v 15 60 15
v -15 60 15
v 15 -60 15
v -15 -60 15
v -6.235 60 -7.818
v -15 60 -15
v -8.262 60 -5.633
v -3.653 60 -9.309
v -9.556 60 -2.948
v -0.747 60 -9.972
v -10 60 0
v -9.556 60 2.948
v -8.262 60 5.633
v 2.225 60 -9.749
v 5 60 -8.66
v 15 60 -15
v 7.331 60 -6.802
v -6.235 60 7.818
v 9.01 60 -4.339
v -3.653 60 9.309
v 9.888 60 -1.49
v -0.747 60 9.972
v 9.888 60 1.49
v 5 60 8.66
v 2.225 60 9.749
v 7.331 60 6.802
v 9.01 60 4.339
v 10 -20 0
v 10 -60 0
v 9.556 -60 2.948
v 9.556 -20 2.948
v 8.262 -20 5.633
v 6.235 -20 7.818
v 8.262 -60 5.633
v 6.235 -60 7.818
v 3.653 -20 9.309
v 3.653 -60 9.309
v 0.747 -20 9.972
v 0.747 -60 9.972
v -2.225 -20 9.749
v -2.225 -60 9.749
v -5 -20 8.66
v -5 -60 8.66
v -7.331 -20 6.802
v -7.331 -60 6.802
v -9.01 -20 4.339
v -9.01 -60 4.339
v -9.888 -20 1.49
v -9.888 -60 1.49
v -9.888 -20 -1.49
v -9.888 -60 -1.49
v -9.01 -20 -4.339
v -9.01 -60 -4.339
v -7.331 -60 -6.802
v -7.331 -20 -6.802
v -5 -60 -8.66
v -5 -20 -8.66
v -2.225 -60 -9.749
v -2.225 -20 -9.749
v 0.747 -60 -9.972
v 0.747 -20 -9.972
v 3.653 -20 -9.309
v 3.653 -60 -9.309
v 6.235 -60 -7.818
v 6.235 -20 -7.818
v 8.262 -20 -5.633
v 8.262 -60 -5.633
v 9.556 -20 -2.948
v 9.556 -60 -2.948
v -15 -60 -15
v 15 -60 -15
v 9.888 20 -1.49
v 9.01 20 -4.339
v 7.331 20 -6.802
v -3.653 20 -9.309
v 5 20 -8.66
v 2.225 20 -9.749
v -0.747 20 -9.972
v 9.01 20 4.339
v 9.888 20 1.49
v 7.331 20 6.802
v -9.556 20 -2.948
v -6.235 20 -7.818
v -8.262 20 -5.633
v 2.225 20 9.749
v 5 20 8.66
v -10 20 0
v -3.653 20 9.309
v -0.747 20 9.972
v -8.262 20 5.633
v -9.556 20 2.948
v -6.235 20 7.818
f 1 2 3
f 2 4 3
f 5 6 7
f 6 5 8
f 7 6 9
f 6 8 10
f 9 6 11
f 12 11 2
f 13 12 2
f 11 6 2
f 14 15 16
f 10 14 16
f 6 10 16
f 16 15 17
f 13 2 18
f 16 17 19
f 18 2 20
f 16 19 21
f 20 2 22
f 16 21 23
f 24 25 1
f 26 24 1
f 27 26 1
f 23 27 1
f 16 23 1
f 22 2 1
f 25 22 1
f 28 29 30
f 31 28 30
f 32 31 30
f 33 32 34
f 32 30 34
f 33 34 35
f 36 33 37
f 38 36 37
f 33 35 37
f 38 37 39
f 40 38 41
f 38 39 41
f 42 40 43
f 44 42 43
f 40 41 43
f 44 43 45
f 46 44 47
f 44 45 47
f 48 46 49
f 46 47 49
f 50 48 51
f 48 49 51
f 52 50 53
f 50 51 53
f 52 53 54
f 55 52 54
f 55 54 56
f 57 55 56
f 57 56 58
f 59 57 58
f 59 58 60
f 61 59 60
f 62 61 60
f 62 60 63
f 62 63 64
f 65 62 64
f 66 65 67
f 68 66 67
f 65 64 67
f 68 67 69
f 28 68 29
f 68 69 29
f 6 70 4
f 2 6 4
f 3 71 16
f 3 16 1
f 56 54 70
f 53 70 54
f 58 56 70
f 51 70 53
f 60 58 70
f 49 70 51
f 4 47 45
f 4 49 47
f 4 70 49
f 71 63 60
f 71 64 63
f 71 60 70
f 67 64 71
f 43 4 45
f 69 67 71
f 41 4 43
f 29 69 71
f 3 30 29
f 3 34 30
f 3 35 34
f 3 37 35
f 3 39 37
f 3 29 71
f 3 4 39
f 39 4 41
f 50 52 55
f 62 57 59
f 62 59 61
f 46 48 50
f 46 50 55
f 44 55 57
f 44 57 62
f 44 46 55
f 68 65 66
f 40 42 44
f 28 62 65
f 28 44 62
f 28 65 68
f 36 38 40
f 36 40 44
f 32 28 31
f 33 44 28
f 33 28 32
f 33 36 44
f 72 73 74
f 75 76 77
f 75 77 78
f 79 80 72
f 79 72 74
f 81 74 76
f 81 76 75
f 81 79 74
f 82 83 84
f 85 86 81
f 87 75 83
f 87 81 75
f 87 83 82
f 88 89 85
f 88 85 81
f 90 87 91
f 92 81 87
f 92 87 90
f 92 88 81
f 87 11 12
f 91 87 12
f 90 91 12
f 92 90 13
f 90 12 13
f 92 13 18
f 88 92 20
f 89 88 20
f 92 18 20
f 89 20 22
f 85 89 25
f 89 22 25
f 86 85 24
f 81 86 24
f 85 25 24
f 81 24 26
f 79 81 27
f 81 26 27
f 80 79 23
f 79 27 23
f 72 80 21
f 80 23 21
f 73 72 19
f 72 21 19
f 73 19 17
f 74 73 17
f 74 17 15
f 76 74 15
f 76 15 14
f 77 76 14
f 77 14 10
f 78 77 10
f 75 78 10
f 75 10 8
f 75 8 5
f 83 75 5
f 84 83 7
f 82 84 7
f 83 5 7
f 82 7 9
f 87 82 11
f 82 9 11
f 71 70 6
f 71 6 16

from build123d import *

# Parameters (mm, degrees)
F0_W     = 30
F0_H     = 30
F1_DEPTH = 60
F2_R     = 10
F3_DEPTH = 40
F4_R     = 10
F5_DEPTH = 40


with BuildPart() as f1:
    # F0 (on Front) → F1 (new body, symmetric)
    with BuildSketch(Plane.XZ):
        Rectangle(F0_W, F0_H)
    extrude(amount=F1_DEPTH, both=True)

    # F2 (on face) → F3 (cut)
    with BuildSketch(Plane(origin=(0, 60, 0), x_dir=(-1, 0, 0), z_dir=(0, 1, 0))):
        Circle(F2_R)
    extrude(amount=-F3_DEPTH, mode=Mode.SUBTRACT)

    # F4 (on face) → F5 (cut)
    with BuildSketch(Plane.XZ.offset(60)):
        Circle(F4_R)
    extrude(amount=-F5_DEPTH, mode=Mode.SUBTRACT)


solid = f1.part
